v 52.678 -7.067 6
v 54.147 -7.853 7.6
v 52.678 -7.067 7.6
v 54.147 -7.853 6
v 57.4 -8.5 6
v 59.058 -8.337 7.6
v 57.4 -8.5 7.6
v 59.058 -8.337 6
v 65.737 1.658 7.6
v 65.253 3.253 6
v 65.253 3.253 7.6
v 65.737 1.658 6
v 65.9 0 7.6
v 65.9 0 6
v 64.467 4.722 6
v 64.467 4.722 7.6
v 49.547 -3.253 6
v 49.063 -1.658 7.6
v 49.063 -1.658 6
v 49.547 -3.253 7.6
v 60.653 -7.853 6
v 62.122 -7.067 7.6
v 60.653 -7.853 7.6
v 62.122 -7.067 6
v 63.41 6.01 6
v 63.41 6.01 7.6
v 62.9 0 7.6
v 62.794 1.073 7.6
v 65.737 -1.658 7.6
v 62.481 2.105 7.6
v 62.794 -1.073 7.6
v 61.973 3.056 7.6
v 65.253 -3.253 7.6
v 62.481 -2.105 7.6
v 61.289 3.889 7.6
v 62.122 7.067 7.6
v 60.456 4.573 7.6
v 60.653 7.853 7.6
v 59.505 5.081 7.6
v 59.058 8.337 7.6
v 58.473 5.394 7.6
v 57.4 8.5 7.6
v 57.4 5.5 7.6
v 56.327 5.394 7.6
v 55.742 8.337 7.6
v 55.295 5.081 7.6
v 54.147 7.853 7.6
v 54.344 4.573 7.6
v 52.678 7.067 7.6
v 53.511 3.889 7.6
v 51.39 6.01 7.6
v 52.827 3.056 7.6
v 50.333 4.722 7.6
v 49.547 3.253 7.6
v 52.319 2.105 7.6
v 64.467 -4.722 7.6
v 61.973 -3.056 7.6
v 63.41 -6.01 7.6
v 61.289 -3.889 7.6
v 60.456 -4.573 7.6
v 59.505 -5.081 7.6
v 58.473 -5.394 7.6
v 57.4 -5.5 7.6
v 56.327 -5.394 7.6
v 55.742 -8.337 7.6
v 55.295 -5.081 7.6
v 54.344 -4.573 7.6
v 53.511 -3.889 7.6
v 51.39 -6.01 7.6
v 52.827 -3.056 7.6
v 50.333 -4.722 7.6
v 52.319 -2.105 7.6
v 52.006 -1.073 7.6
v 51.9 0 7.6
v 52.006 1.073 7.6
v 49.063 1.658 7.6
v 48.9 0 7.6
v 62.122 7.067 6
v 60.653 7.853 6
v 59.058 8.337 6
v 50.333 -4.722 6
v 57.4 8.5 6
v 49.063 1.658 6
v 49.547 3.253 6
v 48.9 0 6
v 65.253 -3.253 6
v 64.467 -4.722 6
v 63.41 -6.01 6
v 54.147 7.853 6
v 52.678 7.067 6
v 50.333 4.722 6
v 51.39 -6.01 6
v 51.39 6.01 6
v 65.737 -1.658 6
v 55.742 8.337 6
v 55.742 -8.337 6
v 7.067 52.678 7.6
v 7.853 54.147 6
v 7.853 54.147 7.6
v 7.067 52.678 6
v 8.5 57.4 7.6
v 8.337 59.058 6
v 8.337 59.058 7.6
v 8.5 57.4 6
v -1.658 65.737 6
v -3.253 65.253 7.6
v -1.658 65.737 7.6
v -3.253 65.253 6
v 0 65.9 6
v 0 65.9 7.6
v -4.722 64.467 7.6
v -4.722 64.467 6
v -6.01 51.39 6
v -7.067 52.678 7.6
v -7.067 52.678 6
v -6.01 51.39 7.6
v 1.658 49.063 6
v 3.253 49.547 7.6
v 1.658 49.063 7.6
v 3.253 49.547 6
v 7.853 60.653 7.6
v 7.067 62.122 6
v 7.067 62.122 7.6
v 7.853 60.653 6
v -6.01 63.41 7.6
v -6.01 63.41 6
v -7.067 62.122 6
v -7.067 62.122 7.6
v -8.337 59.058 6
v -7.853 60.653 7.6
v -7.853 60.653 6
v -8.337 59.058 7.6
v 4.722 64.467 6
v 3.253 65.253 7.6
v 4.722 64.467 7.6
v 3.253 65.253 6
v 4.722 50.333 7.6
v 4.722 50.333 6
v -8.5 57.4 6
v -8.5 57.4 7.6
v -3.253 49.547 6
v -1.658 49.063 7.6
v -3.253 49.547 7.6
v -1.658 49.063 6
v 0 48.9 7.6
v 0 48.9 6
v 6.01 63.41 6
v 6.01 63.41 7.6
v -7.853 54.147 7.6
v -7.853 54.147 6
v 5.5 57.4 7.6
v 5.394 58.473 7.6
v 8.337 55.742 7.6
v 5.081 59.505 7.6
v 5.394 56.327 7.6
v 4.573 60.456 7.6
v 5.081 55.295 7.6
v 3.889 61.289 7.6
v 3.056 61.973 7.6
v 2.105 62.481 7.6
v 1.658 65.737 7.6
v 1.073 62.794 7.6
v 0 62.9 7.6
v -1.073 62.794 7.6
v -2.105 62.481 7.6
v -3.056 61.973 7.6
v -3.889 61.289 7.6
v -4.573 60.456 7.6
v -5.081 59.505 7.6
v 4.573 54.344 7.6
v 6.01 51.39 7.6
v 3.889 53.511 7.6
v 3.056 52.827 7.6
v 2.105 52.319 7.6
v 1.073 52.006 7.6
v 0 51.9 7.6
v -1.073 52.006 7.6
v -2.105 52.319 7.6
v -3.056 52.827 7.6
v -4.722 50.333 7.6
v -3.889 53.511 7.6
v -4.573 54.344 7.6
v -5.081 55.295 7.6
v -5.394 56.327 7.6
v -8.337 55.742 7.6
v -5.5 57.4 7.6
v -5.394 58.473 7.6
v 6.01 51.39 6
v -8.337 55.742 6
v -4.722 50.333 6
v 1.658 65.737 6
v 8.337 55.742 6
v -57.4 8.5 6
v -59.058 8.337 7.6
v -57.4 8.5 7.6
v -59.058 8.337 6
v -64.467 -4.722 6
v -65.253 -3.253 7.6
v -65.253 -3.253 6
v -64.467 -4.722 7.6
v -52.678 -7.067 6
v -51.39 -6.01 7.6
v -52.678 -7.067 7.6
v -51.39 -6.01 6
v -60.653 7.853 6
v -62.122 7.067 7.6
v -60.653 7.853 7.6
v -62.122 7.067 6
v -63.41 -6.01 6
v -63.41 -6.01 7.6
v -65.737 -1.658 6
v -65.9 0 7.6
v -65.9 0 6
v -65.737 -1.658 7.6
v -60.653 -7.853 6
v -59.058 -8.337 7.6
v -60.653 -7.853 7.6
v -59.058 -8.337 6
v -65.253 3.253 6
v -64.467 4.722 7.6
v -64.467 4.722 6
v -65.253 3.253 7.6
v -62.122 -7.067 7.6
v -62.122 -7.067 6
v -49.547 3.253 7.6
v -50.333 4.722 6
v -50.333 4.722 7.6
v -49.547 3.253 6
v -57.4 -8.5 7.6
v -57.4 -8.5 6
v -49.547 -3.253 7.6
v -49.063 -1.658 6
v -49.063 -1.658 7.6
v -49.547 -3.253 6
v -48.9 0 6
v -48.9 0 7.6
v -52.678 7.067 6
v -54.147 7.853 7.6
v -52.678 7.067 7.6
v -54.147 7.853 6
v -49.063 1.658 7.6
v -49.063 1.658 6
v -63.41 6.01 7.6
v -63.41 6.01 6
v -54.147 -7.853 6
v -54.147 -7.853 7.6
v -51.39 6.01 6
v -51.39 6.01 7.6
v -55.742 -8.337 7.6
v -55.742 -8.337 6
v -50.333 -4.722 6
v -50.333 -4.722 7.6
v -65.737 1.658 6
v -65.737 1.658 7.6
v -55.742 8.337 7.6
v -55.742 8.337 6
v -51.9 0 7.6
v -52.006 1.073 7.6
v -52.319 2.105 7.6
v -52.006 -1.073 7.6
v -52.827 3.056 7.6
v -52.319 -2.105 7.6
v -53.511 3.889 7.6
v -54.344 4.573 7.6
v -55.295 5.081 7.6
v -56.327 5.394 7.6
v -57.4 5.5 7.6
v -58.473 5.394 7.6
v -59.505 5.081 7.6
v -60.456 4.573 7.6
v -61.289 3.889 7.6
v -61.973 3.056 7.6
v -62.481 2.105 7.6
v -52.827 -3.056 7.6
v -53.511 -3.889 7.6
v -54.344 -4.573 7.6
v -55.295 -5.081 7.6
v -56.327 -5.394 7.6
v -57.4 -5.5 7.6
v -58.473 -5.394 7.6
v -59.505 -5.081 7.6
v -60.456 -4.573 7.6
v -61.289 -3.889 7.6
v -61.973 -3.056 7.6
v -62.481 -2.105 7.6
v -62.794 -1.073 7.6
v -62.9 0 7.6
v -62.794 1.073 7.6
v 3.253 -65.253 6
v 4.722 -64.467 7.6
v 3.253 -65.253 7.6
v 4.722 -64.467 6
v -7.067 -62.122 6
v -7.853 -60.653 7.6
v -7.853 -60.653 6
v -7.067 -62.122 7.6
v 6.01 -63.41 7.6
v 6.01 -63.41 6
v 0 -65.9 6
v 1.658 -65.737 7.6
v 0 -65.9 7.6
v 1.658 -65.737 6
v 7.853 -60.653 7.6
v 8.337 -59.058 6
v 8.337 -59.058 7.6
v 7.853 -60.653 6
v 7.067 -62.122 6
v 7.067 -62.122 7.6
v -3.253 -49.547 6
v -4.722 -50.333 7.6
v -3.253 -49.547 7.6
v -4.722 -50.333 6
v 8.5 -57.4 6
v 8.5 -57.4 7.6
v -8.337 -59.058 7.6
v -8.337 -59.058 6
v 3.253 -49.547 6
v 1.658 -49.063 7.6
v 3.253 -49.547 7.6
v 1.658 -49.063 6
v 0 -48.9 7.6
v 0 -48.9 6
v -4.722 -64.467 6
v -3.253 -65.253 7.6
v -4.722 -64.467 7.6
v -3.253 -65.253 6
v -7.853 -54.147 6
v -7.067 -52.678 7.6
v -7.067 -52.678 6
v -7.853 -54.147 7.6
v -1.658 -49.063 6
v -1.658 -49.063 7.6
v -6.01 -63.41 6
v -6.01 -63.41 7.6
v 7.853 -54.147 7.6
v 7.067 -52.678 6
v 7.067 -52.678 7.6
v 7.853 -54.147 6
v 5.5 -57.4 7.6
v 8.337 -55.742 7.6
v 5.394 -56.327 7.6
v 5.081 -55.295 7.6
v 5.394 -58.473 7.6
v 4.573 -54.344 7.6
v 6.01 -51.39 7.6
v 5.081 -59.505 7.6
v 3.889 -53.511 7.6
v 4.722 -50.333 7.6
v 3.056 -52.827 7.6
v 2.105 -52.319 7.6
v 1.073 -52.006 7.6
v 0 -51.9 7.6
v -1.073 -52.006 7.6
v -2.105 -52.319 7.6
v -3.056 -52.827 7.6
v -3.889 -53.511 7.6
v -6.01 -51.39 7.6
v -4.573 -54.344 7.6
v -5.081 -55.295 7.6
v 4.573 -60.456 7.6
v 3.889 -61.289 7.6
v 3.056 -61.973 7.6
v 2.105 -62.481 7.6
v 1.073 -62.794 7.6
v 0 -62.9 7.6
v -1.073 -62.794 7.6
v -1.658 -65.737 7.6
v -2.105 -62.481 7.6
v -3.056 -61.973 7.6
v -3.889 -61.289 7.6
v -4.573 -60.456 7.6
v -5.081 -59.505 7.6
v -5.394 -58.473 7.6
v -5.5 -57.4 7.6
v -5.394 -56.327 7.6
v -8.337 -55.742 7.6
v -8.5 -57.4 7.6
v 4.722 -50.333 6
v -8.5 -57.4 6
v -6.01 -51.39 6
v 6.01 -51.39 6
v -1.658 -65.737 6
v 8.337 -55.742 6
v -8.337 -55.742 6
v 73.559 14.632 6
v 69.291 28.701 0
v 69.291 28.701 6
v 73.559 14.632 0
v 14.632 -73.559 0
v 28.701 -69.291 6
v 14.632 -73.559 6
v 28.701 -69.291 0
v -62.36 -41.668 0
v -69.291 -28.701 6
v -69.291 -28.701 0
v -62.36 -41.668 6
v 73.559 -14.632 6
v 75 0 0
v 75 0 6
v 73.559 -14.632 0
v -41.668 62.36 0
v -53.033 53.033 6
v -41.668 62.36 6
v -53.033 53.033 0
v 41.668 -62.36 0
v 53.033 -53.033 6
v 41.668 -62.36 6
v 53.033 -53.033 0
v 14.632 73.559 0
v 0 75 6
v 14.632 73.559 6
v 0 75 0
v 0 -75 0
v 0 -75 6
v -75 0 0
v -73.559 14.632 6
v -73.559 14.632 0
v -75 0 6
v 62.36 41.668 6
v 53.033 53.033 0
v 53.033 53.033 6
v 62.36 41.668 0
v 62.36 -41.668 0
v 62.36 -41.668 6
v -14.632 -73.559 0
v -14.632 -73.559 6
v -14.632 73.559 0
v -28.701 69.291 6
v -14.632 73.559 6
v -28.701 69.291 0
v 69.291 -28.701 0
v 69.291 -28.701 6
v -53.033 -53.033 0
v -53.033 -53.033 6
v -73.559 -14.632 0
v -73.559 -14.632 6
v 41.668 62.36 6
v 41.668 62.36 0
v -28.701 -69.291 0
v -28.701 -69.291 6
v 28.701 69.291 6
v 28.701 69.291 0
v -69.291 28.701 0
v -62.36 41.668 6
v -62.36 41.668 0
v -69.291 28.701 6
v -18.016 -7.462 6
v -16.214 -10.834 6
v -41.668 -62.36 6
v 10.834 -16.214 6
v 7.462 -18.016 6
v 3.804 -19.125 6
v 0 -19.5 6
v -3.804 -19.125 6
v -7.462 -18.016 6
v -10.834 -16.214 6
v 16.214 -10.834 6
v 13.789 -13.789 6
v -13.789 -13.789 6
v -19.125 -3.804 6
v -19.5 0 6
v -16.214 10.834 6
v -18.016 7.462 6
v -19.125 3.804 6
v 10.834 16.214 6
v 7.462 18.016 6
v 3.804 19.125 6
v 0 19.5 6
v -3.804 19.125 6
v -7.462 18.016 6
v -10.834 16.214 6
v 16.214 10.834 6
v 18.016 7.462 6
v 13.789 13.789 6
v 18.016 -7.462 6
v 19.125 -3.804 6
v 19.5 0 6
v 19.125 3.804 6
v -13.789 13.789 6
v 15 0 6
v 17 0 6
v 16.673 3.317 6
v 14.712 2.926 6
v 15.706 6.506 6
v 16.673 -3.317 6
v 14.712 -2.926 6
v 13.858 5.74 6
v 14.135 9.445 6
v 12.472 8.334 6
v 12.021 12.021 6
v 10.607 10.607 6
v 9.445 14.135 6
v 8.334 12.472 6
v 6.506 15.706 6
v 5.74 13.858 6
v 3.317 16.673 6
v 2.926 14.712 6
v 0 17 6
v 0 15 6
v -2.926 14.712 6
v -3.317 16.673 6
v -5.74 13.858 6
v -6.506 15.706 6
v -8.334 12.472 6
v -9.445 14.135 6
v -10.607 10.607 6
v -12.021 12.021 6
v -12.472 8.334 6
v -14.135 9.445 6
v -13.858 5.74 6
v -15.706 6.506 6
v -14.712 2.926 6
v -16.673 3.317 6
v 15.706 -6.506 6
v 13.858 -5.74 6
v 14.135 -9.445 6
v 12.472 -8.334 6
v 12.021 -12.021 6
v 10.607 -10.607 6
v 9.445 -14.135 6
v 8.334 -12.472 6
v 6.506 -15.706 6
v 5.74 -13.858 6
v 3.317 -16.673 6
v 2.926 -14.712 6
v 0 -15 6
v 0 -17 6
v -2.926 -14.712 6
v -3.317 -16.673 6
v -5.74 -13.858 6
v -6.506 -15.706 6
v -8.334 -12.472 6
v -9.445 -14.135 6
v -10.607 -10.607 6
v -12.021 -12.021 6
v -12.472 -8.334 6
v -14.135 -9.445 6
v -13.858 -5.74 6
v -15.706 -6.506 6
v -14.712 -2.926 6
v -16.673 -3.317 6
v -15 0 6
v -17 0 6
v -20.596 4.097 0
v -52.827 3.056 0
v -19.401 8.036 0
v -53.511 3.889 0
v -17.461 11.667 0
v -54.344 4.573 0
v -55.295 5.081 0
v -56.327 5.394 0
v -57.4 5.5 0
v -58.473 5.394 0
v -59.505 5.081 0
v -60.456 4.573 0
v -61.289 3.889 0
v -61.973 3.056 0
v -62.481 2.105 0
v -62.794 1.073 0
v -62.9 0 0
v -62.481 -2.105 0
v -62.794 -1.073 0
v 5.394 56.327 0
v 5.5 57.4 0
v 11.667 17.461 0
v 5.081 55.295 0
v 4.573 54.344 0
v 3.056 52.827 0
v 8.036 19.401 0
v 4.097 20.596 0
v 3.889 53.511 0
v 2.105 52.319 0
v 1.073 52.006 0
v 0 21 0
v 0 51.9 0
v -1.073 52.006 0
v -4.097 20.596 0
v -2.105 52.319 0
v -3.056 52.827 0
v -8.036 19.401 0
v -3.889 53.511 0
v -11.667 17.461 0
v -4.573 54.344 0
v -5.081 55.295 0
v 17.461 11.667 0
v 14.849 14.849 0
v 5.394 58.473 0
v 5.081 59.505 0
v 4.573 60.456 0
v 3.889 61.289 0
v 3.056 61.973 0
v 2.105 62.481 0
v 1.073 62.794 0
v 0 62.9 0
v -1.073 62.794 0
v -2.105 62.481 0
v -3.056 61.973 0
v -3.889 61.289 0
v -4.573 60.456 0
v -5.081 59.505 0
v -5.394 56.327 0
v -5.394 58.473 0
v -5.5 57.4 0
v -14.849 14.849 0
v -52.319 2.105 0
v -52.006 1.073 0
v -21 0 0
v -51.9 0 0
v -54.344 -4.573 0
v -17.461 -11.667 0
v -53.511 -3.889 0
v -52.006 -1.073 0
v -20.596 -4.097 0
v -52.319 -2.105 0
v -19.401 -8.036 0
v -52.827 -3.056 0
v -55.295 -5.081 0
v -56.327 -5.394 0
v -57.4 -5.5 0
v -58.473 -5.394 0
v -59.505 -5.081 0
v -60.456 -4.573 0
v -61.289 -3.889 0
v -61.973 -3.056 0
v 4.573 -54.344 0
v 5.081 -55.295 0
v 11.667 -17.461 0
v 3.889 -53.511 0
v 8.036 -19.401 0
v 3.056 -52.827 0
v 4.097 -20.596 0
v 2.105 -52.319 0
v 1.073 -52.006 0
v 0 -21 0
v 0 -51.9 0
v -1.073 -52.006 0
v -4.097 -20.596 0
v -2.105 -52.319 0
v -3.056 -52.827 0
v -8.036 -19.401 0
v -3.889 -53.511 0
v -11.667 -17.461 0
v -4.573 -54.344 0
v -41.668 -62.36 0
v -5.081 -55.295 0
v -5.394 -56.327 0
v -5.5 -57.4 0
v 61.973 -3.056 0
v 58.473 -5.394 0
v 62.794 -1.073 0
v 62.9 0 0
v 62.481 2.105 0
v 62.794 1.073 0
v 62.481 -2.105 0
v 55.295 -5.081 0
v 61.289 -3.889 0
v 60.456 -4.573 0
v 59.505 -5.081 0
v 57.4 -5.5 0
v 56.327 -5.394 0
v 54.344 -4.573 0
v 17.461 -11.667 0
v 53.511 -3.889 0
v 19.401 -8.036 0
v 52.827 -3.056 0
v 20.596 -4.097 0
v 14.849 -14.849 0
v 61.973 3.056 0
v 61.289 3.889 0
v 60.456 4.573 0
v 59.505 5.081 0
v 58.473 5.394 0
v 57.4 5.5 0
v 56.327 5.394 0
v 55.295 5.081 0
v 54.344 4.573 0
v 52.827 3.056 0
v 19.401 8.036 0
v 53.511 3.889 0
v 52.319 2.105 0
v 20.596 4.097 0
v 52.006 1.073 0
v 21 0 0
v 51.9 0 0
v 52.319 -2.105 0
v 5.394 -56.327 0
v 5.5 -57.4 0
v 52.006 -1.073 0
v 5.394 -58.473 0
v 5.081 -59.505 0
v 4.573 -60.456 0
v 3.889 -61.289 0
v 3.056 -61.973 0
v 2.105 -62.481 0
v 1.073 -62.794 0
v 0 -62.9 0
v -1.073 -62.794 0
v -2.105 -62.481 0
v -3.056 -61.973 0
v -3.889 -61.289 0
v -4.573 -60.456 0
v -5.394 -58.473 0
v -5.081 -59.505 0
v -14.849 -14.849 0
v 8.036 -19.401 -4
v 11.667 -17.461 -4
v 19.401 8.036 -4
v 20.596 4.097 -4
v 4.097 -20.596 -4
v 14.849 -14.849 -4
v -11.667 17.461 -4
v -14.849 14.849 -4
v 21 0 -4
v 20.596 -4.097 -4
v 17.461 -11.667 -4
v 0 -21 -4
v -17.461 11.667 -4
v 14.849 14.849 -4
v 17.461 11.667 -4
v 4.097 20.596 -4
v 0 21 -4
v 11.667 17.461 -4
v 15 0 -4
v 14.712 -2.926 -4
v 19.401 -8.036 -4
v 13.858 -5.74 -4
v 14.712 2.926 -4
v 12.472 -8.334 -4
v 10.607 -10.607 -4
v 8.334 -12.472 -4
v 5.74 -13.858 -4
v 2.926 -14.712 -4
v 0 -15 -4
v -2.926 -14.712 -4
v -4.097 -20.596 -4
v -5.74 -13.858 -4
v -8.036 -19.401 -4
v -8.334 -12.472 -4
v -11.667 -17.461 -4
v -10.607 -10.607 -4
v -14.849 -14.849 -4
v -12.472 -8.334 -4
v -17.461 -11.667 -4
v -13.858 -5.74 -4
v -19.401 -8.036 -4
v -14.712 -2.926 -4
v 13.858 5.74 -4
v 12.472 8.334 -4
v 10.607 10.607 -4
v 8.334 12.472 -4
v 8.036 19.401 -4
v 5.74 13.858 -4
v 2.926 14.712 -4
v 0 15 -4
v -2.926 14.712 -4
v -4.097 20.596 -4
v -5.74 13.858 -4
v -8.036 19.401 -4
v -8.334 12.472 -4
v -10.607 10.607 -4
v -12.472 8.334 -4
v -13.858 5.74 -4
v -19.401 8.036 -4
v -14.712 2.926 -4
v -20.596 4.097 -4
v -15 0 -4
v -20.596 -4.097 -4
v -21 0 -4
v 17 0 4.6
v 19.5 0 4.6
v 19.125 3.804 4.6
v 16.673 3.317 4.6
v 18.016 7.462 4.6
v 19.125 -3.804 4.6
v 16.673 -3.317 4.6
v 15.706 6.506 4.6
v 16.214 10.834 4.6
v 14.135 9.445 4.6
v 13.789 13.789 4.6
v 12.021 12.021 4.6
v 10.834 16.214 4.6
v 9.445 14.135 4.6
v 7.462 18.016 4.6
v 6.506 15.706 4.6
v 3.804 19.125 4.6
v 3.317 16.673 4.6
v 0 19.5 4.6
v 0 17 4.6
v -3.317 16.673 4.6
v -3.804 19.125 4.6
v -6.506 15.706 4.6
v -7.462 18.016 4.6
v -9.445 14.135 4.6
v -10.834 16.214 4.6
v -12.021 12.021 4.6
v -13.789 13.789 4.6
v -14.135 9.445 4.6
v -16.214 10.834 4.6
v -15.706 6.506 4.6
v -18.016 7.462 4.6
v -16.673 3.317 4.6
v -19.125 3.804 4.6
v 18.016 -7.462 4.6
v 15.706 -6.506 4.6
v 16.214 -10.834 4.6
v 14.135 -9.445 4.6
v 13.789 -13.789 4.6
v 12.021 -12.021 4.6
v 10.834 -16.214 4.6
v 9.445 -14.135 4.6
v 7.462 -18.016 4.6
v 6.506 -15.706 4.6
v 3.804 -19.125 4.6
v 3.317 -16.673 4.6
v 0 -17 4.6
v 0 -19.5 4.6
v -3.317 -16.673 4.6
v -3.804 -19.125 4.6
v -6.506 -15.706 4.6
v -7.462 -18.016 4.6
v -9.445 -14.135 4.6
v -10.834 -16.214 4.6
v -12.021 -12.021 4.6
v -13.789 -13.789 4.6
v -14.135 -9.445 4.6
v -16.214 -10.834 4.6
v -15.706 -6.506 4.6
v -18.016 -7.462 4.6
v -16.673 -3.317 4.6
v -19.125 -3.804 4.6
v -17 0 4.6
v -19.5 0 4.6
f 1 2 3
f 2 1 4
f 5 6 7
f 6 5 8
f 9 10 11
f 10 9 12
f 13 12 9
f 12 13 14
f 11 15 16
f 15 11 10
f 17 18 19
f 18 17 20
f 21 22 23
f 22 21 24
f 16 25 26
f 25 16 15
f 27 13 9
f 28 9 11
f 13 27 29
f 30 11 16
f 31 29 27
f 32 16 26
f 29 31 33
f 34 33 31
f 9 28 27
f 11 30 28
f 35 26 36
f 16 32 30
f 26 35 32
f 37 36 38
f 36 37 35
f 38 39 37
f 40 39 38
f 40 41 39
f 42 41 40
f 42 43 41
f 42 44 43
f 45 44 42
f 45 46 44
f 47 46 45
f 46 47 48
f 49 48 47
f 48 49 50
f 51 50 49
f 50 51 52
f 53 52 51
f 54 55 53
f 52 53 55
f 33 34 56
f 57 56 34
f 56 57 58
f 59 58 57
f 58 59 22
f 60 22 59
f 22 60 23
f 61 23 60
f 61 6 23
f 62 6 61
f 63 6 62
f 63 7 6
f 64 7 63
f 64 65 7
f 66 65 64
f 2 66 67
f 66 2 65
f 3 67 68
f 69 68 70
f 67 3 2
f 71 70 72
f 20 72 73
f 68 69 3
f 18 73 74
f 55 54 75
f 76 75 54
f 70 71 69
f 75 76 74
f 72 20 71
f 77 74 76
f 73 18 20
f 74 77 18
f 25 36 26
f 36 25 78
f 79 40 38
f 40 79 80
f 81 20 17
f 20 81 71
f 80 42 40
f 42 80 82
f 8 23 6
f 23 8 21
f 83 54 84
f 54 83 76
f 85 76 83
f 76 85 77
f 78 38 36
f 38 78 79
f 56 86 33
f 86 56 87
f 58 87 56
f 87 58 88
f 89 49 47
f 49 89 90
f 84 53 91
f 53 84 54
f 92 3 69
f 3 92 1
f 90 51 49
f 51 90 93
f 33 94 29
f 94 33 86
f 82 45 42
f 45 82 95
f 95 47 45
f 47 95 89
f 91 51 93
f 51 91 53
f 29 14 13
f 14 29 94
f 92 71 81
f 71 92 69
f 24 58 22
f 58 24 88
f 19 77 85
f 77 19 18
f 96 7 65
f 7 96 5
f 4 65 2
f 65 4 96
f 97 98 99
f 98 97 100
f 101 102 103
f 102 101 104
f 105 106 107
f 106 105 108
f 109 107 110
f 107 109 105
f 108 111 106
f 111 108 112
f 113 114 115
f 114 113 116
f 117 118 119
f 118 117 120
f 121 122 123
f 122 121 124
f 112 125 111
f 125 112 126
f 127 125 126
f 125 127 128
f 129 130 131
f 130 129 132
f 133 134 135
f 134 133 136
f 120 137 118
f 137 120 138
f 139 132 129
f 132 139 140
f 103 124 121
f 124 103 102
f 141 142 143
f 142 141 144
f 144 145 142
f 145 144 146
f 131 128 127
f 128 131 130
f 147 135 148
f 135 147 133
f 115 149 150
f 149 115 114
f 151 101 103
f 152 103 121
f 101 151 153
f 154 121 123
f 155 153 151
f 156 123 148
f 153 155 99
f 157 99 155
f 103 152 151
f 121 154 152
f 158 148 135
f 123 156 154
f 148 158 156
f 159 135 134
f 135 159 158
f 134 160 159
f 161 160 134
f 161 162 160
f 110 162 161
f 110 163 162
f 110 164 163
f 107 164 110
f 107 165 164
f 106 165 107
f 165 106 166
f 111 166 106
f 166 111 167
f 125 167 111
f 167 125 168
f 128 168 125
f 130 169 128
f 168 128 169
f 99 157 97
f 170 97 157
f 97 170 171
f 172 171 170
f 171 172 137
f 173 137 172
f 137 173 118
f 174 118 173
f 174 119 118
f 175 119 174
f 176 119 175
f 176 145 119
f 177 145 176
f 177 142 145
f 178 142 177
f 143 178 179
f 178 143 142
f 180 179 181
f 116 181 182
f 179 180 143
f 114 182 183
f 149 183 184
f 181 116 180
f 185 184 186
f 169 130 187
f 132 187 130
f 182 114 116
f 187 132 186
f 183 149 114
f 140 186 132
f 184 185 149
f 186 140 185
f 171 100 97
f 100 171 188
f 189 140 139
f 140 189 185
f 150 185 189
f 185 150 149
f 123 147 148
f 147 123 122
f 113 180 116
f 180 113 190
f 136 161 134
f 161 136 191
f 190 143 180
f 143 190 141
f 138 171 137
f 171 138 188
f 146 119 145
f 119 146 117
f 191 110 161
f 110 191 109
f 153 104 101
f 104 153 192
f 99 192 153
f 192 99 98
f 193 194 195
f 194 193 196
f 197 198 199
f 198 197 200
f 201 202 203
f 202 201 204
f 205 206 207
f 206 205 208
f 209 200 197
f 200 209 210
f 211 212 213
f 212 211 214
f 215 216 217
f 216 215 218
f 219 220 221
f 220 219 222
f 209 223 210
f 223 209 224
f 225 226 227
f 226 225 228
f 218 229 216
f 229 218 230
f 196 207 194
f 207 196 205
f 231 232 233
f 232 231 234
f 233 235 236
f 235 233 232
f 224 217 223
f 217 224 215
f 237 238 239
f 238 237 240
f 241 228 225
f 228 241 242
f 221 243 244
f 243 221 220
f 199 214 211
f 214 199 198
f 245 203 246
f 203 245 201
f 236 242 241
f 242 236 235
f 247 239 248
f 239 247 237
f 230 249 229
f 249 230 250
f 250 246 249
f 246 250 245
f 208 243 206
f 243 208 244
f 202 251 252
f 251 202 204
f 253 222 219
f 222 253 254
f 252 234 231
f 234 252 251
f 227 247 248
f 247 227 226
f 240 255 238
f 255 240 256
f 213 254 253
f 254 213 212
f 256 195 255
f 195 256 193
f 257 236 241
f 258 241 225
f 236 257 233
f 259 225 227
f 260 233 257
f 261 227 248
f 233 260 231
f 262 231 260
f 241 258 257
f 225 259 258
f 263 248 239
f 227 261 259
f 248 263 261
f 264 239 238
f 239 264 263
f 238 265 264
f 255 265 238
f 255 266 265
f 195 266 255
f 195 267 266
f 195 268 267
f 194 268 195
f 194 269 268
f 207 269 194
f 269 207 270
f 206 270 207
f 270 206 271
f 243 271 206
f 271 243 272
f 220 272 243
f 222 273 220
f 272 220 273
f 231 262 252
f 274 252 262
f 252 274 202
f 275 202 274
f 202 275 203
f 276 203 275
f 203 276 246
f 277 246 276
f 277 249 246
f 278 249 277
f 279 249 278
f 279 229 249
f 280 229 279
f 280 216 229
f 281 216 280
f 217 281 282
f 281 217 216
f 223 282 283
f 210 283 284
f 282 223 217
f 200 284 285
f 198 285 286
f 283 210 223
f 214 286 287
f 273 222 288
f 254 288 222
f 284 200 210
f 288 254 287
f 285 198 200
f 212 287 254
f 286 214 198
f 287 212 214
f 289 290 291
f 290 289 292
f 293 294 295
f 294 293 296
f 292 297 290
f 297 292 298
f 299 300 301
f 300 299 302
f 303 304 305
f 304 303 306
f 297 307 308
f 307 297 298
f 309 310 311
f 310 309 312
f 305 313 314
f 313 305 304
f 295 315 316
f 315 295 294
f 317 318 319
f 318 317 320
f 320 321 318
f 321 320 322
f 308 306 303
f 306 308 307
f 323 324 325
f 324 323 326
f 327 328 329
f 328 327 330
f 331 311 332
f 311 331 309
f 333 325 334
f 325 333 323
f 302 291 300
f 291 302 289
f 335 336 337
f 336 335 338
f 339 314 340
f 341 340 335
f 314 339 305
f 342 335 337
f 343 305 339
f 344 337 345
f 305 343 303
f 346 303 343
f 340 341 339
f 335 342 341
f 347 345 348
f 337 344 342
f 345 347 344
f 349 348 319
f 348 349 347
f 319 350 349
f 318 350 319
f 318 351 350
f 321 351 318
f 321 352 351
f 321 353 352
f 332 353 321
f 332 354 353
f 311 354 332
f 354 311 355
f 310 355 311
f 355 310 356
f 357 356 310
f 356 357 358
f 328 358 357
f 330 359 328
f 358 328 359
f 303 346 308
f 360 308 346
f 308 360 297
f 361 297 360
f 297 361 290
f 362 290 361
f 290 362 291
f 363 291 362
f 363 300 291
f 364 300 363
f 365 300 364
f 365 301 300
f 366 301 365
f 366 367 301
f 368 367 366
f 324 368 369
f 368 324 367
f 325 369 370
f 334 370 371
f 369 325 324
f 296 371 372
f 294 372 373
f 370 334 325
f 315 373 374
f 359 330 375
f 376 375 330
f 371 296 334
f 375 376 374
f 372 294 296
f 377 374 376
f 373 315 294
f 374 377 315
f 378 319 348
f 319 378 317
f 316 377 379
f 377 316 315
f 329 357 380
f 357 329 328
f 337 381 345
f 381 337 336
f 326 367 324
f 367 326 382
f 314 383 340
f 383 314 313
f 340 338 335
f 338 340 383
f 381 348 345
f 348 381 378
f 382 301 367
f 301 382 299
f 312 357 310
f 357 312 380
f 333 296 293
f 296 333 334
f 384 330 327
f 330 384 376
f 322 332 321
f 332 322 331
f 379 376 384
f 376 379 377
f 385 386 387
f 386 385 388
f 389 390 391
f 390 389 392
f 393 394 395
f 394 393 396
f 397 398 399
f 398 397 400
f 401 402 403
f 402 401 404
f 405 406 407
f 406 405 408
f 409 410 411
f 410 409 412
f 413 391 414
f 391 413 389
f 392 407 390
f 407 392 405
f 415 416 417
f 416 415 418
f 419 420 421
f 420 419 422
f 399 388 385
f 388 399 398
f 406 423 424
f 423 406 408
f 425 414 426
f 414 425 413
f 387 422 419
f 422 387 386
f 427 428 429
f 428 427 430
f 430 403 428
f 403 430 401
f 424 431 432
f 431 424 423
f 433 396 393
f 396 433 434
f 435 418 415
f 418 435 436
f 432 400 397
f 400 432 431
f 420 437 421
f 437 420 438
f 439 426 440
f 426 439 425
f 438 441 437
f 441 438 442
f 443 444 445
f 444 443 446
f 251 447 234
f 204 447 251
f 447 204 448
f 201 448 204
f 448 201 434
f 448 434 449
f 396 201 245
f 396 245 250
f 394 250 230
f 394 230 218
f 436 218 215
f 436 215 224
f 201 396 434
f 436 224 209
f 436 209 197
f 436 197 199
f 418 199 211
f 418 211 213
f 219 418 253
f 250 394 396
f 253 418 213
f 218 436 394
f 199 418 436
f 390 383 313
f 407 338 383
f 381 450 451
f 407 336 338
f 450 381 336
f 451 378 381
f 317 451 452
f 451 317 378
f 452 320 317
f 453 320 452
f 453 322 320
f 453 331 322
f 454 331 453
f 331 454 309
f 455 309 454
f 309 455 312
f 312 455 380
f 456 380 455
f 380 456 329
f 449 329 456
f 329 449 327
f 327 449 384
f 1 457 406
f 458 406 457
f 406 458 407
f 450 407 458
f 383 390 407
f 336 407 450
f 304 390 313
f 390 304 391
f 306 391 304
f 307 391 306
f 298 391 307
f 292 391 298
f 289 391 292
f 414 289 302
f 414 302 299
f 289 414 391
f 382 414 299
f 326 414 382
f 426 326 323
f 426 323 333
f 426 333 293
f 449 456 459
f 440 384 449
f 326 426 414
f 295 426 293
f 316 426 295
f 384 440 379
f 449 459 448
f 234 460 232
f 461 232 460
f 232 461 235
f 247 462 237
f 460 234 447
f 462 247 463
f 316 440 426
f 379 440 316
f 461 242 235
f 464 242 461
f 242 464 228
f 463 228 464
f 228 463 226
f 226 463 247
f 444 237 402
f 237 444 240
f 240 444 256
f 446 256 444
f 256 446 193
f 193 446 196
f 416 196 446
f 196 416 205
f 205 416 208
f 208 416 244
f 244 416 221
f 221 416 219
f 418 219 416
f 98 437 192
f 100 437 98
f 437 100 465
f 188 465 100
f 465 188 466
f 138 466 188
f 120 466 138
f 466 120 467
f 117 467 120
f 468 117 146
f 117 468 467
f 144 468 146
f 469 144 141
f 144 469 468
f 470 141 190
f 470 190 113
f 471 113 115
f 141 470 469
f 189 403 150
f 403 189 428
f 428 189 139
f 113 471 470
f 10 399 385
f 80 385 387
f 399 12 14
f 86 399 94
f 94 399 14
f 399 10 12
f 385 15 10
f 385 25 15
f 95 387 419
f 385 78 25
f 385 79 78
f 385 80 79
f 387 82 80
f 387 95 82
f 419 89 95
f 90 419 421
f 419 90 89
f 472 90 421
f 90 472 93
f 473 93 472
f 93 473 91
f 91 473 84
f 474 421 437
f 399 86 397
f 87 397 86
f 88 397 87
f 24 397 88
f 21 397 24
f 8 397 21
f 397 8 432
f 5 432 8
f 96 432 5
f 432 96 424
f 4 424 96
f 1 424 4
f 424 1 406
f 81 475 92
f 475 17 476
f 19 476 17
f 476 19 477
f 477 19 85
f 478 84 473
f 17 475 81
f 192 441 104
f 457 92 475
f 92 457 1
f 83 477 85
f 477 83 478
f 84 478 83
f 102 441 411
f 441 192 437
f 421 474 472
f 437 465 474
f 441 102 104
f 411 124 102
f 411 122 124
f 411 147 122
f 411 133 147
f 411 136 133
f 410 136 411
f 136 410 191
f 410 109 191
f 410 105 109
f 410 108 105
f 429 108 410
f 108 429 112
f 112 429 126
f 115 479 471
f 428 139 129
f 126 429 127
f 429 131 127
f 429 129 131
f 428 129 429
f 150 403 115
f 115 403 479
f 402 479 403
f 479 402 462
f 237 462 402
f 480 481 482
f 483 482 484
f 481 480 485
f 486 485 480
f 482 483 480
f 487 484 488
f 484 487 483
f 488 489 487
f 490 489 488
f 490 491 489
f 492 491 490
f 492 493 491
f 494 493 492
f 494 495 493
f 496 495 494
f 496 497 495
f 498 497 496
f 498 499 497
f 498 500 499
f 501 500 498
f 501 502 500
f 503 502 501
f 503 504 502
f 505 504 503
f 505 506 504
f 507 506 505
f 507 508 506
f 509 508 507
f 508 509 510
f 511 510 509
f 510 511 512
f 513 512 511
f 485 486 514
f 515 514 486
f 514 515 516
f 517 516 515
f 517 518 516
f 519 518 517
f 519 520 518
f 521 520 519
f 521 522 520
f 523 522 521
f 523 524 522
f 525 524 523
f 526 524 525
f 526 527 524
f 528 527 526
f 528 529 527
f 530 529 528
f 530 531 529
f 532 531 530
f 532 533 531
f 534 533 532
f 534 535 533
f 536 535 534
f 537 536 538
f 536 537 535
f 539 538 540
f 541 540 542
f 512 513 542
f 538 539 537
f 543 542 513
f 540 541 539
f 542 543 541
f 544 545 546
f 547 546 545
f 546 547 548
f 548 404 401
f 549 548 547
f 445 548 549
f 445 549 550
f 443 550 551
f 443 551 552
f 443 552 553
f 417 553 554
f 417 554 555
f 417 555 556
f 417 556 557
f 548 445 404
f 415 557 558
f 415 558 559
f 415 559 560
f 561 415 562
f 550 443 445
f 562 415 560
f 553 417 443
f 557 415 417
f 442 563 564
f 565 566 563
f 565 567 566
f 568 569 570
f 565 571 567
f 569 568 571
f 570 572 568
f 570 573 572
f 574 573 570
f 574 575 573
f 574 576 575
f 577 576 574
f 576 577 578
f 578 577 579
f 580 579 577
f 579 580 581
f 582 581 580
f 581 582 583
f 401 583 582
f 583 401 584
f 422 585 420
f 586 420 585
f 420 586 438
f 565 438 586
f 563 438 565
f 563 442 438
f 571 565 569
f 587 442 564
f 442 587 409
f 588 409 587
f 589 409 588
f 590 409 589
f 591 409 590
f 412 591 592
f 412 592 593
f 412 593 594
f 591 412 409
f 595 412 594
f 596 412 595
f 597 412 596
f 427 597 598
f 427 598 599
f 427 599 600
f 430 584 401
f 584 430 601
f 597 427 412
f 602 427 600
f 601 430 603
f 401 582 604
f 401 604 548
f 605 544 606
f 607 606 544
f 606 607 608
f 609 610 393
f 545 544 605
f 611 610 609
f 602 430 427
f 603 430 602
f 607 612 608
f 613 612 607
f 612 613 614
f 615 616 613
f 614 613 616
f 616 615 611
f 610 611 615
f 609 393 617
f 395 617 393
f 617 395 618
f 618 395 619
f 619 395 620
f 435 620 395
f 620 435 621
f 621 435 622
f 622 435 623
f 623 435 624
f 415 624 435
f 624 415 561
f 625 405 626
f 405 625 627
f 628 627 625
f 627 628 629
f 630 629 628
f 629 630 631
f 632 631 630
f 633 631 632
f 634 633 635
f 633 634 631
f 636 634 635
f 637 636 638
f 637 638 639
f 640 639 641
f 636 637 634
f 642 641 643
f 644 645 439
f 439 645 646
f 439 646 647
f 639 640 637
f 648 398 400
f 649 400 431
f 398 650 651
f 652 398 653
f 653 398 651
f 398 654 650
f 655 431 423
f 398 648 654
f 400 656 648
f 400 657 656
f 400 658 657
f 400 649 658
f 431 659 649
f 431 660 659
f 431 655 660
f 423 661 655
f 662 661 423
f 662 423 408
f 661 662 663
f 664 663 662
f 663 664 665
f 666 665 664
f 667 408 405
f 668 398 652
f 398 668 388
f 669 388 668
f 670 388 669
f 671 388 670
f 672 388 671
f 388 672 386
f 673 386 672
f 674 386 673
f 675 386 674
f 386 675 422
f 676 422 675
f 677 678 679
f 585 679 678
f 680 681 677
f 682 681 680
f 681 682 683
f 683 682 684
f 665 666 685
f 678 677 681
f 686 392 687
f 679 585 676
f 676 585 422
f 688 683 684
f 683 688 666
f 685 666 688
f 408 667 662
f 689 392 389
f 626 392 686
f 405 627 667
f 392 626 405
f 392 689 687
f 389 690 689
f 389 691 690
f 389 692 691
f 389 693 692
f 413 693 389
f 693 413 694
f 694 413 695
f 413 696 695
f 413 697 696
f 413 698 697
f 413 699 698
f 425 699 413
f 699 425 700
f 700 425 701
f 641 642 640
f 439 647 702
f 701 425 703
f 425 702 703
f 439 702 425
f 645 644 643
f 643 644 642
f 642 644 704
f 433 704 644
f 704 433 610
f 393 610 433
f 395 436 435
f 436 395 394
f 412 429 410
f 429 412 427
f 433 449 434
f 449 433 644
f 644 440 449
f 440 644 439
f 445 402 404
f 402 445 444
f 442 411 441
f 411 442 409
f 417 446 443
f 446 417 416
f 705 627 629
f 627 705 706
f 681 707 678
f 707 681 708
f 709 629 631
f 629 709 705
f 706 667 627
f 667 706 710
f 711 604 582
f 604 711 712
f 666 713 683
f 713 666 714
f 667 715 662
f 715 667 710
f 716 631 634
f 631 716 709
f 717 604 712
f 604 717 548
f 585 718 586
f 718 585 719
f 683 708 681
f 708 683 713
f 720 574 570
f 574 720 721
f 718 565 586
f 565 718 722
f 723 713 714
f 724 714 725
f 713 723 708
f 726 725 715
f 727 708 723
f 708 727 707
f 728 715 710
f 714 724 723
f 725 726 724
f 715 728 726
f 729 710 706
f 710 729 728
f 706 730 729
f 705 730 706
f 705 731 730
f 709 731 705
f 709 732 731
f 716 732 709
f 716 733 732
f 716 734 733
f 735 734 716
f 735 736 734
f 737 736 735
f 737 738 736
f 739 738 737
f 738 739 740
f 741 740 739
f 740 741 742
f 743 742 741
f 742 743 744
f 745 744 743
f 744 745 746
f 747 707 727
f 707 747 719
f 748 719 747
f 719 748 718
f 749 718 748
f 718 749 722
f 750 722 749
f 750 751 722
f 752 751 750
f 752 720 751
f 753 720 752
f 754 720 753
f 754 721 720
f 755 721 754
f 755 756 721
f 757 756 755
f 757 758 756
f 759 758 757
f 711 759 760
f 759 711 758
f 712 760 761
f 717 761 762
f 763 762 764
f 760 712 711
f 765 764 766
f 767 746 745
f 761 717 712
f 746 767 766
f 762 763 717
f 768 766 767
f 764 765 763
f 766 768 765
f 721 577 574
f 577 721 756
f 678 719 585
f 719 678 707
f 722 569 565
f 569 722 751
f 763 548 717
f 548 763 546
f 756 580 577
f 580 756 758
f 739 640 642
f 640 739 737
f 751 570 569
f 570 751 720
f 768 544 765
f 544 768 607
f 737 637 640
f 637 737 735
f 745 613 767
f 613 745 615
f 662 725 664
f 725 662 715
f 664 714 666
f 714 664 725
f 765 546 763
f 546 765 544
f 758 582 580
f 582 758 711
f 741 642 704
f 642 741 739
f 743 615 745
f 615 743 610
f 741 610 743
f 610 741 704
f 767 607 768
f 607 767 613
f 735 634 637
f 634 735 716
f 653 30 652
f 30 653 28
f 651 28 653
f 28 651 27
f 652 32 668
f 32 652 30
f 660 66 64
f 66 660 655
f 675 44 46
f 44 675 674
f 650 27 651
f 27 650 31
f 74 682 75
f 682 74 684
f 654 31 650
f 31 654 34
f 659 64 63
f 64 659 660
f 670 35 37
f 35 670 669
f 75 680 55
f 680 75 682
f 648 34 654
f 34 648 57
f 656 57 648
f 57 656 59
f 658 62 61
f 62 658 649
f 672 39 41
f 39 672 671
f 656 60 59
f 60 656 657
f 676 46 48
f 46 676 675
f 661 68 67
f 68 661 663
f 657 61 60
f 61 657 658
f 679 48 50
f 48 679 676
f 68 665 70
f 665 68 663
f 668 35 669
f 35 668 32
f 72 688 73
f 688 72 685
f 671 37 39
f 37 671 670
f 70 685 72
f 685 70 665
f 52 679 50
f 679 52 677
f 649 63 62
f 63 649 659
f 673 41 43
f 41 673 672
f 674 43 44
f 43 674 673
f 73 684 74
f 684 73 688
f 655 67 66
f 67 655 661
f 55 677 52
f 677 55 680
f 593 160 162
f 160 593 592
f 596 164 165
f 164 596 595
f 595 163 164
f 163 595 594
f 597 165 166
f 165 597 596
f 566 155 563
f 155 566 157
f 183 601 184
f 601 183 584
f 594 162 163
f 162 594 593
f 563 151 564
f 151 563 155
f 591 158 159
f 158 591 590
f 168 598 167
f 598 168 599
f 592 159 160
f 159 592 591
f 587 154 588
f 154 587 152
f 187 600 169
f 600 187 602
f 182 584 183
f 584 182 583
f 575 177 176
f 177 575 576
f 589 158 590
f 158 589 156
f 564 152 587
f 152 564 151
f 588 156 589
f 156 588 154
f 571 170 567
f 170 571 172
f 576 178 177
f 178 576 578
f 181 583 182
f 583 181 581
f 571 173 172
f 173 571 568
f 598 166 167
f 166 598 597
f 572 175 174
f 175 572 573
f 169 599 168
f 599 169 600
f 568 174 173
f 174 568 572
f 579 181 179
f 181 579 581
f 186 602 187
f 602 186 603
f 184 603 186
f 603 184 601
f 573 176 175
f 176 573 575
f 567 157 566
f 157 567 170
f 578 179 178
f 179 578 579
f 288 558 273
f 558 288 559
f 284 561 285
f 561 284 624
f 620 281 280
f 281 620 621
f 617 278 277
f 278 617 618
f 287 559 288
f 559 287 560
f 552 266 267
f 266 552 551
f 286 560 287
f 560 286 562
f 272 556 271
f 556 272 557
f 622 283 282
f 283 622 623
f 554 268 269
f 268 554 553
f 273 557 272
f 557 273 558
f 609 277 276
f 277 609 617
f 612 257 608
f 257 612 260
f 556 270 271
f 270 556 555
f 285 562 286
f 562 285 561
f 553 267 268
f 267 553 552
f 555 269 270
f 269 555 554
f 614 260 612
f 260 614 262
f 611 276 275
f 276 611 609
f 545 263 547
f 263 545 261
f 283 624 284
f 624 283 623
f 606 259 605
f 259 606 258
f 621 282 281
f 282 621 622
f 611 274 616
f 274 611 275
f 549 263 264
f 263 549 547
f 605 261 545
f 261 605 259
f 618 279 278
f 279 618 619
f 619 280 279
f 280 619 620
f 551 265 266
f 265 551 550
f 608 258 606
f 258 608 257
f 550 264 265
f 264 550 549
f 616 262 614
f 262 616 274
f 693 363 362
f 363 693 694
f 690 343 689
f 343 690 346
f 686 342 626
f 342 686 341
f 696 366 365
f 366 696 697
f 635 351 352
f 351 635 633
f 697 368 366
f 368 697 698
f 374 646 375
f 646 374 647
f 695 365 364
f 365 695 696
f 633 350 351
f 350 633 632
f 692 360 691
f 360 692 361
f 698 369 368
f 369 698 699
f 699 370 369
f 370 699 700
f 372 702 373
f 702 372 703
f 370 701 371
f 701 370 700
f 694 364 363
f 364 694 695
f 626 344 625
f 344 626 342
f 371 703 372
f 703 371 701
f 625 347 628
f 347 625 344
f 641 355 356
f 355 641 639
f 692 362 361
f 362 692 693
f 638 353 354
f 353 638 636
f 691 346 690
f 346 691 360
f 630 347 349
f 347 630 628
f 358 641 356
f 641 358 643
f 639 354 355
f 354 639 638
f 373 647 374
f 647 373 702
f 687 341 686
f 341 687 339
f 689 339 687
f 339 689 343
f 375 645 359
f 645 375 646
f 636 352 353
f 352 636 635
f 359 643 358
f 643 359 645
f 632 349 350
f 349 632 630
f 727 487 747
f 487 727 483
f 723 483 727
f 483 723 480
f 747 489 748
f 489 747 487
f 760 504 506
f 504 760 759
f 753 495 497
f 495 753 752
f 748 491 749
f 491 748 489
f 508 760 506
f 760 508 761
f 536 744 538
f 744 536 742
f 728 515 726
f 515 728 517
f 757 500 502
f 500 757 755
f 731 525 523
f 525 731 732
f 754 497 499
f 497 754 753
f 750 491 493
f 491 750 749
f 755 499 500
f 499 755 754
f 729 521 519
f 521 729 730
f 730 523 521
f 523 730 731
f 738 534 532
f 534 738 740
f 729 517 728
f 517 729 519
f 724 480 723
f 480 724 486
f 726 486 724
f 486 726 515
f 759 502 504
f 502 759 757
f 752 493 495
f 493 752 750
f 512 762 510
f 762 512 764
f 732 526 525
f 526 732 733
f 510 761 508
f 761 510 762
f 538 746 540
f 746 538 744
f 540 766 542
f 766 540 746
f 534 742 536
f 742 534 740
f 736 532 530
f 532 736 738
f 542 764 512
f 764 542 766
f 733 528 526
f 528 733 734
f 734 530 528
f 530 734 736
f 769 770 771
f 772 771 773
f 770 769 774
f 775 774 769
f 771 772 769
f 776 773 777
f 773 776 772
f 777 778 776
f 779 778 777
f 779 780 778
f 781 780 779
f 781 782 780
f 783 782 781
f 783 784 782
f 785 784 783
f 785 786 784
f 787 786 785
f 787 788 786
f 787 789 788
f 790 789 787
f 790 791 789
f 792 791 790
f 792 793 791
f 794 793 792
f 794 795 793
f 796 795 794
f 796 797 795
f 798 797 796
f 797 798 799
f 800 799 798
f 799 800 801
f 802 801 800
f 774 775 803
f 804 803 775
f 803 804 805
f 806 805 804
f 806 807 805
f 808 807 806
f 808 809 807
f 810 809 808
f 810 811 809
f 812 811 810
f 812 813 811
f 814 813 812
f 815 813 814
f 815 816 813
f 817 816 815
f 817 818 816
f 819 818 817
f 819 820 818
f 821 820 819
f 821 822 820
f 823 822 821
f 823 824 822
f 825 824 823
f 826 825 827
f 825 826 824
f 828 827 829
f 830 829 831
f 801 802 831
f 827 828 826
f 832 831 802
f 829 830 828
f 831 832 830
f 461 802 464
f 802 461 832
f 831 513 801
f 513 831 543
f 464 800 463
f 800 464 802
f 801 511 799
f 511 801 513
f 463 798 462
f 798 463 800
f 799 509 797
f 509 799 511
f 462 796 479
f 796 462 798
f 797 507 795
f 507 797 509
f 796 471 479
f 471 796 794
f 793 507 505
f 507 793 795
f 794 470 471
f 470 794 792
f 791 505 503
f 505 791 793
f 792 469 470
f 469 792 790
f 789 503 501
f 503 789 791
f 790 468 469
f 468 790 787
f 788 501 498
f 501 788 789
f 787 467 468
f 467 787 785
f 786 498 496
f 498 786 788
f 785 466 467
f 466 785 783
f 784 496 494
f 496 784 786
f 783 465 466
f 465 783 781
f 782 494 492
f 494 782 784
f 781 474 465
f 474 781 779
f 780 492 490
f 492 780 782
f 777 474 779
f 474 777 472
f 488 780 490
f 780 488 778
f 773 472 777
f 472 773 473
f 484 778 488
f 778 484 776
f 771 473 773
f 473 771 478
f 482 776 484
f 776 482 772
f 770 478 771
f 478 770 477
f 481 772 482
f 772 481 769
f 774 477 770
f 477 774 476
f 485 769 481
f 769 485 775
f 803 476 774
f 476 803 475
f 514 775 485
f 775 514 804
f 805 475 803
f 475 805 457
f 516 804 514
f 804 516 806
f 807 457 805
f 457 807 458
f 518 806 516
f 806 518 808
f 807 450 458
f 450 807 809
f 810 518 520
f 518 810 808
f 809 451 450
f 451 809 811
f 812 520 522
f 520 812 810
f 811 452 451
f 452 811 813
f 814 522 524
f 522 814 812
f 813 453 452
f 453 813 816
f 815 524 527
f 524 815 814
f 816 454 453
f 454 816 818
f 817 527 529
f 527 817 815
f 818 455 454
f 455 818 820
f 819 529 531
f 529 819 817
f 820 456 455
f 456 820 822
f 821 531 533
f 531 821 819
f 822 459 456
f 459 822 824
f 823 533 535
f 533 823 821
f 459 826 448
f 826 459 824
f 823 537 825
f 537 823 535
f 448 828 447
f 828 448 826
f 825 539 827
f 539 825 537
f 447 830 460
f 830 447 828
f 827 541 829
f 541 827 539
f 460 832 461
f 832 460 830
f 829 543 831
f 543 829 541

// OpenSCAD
$fn = 32;

// ----------------------------------------------------------------------
// Bolt-circle flange: 150 mm outside, 4 bolt holes, bore 30 mm
// ----------------------------------------------------------------------

// --- parameters (mm) ---
flange_d = 150;           // flange outside diameter
flange_t = 6;             // flange thickness
bolts = 4;                // number of bolt holes
bolt_d = 11;              // bolt clearance
bolt_r = 57.4;            // bolt circle radius
bore_d = 30;              // centre bore
spigot_d = 42;            // spigot diameter
spigot_h = 5;             // spigot height below the flange
sink = 1;                 // overlap into the flange
spot_d = 17;              // spot faced bosses
spot_h = 1.6;             // spot face height
groove_w = 2.5;           // gasket groove width
groove_d = 1.4;           // gasket groove depth
groove_r = 17;            // groove radius
groove_z = 4.6;           // groove floor depth from the face

module body() {
  cylinder(h = flange_t, d = flange_d);
  /* spigot on the back face, sunk into the flange */
  translate([0, 0, -spigot_h + sink]) cylinder(h = spigot_h, d = spigot_d);
  /* spot faced pads under the bolt heads */
  for (i = [0 : bolts - 1]) rotate([0, 0, i * 360 / bolts]) translate([bolt_r, 0, flange_t - 1]) cylinder(h = spot_h + 1, d = spot_d);
}

difference() {
  body();
  /* bolt circle */
  for (i = [0 : bolts - 1]) rotate([0, 0, i * 360 / bolts]) translate([bolt_r, 0, -spigot_h - 1]) cylinder(h = flange_t + spigot_h + 3, d = bolt_d);
  translate([0, 0, -spigot_h - 1]) cylinder(h = flange_t + spigot_h + 3, d = bore_d);
  /* gasket groove on the front face */
  rotate_extrude() translate([groove_r, groove_z]) square([groove_w, groove_d + 1]);
}
